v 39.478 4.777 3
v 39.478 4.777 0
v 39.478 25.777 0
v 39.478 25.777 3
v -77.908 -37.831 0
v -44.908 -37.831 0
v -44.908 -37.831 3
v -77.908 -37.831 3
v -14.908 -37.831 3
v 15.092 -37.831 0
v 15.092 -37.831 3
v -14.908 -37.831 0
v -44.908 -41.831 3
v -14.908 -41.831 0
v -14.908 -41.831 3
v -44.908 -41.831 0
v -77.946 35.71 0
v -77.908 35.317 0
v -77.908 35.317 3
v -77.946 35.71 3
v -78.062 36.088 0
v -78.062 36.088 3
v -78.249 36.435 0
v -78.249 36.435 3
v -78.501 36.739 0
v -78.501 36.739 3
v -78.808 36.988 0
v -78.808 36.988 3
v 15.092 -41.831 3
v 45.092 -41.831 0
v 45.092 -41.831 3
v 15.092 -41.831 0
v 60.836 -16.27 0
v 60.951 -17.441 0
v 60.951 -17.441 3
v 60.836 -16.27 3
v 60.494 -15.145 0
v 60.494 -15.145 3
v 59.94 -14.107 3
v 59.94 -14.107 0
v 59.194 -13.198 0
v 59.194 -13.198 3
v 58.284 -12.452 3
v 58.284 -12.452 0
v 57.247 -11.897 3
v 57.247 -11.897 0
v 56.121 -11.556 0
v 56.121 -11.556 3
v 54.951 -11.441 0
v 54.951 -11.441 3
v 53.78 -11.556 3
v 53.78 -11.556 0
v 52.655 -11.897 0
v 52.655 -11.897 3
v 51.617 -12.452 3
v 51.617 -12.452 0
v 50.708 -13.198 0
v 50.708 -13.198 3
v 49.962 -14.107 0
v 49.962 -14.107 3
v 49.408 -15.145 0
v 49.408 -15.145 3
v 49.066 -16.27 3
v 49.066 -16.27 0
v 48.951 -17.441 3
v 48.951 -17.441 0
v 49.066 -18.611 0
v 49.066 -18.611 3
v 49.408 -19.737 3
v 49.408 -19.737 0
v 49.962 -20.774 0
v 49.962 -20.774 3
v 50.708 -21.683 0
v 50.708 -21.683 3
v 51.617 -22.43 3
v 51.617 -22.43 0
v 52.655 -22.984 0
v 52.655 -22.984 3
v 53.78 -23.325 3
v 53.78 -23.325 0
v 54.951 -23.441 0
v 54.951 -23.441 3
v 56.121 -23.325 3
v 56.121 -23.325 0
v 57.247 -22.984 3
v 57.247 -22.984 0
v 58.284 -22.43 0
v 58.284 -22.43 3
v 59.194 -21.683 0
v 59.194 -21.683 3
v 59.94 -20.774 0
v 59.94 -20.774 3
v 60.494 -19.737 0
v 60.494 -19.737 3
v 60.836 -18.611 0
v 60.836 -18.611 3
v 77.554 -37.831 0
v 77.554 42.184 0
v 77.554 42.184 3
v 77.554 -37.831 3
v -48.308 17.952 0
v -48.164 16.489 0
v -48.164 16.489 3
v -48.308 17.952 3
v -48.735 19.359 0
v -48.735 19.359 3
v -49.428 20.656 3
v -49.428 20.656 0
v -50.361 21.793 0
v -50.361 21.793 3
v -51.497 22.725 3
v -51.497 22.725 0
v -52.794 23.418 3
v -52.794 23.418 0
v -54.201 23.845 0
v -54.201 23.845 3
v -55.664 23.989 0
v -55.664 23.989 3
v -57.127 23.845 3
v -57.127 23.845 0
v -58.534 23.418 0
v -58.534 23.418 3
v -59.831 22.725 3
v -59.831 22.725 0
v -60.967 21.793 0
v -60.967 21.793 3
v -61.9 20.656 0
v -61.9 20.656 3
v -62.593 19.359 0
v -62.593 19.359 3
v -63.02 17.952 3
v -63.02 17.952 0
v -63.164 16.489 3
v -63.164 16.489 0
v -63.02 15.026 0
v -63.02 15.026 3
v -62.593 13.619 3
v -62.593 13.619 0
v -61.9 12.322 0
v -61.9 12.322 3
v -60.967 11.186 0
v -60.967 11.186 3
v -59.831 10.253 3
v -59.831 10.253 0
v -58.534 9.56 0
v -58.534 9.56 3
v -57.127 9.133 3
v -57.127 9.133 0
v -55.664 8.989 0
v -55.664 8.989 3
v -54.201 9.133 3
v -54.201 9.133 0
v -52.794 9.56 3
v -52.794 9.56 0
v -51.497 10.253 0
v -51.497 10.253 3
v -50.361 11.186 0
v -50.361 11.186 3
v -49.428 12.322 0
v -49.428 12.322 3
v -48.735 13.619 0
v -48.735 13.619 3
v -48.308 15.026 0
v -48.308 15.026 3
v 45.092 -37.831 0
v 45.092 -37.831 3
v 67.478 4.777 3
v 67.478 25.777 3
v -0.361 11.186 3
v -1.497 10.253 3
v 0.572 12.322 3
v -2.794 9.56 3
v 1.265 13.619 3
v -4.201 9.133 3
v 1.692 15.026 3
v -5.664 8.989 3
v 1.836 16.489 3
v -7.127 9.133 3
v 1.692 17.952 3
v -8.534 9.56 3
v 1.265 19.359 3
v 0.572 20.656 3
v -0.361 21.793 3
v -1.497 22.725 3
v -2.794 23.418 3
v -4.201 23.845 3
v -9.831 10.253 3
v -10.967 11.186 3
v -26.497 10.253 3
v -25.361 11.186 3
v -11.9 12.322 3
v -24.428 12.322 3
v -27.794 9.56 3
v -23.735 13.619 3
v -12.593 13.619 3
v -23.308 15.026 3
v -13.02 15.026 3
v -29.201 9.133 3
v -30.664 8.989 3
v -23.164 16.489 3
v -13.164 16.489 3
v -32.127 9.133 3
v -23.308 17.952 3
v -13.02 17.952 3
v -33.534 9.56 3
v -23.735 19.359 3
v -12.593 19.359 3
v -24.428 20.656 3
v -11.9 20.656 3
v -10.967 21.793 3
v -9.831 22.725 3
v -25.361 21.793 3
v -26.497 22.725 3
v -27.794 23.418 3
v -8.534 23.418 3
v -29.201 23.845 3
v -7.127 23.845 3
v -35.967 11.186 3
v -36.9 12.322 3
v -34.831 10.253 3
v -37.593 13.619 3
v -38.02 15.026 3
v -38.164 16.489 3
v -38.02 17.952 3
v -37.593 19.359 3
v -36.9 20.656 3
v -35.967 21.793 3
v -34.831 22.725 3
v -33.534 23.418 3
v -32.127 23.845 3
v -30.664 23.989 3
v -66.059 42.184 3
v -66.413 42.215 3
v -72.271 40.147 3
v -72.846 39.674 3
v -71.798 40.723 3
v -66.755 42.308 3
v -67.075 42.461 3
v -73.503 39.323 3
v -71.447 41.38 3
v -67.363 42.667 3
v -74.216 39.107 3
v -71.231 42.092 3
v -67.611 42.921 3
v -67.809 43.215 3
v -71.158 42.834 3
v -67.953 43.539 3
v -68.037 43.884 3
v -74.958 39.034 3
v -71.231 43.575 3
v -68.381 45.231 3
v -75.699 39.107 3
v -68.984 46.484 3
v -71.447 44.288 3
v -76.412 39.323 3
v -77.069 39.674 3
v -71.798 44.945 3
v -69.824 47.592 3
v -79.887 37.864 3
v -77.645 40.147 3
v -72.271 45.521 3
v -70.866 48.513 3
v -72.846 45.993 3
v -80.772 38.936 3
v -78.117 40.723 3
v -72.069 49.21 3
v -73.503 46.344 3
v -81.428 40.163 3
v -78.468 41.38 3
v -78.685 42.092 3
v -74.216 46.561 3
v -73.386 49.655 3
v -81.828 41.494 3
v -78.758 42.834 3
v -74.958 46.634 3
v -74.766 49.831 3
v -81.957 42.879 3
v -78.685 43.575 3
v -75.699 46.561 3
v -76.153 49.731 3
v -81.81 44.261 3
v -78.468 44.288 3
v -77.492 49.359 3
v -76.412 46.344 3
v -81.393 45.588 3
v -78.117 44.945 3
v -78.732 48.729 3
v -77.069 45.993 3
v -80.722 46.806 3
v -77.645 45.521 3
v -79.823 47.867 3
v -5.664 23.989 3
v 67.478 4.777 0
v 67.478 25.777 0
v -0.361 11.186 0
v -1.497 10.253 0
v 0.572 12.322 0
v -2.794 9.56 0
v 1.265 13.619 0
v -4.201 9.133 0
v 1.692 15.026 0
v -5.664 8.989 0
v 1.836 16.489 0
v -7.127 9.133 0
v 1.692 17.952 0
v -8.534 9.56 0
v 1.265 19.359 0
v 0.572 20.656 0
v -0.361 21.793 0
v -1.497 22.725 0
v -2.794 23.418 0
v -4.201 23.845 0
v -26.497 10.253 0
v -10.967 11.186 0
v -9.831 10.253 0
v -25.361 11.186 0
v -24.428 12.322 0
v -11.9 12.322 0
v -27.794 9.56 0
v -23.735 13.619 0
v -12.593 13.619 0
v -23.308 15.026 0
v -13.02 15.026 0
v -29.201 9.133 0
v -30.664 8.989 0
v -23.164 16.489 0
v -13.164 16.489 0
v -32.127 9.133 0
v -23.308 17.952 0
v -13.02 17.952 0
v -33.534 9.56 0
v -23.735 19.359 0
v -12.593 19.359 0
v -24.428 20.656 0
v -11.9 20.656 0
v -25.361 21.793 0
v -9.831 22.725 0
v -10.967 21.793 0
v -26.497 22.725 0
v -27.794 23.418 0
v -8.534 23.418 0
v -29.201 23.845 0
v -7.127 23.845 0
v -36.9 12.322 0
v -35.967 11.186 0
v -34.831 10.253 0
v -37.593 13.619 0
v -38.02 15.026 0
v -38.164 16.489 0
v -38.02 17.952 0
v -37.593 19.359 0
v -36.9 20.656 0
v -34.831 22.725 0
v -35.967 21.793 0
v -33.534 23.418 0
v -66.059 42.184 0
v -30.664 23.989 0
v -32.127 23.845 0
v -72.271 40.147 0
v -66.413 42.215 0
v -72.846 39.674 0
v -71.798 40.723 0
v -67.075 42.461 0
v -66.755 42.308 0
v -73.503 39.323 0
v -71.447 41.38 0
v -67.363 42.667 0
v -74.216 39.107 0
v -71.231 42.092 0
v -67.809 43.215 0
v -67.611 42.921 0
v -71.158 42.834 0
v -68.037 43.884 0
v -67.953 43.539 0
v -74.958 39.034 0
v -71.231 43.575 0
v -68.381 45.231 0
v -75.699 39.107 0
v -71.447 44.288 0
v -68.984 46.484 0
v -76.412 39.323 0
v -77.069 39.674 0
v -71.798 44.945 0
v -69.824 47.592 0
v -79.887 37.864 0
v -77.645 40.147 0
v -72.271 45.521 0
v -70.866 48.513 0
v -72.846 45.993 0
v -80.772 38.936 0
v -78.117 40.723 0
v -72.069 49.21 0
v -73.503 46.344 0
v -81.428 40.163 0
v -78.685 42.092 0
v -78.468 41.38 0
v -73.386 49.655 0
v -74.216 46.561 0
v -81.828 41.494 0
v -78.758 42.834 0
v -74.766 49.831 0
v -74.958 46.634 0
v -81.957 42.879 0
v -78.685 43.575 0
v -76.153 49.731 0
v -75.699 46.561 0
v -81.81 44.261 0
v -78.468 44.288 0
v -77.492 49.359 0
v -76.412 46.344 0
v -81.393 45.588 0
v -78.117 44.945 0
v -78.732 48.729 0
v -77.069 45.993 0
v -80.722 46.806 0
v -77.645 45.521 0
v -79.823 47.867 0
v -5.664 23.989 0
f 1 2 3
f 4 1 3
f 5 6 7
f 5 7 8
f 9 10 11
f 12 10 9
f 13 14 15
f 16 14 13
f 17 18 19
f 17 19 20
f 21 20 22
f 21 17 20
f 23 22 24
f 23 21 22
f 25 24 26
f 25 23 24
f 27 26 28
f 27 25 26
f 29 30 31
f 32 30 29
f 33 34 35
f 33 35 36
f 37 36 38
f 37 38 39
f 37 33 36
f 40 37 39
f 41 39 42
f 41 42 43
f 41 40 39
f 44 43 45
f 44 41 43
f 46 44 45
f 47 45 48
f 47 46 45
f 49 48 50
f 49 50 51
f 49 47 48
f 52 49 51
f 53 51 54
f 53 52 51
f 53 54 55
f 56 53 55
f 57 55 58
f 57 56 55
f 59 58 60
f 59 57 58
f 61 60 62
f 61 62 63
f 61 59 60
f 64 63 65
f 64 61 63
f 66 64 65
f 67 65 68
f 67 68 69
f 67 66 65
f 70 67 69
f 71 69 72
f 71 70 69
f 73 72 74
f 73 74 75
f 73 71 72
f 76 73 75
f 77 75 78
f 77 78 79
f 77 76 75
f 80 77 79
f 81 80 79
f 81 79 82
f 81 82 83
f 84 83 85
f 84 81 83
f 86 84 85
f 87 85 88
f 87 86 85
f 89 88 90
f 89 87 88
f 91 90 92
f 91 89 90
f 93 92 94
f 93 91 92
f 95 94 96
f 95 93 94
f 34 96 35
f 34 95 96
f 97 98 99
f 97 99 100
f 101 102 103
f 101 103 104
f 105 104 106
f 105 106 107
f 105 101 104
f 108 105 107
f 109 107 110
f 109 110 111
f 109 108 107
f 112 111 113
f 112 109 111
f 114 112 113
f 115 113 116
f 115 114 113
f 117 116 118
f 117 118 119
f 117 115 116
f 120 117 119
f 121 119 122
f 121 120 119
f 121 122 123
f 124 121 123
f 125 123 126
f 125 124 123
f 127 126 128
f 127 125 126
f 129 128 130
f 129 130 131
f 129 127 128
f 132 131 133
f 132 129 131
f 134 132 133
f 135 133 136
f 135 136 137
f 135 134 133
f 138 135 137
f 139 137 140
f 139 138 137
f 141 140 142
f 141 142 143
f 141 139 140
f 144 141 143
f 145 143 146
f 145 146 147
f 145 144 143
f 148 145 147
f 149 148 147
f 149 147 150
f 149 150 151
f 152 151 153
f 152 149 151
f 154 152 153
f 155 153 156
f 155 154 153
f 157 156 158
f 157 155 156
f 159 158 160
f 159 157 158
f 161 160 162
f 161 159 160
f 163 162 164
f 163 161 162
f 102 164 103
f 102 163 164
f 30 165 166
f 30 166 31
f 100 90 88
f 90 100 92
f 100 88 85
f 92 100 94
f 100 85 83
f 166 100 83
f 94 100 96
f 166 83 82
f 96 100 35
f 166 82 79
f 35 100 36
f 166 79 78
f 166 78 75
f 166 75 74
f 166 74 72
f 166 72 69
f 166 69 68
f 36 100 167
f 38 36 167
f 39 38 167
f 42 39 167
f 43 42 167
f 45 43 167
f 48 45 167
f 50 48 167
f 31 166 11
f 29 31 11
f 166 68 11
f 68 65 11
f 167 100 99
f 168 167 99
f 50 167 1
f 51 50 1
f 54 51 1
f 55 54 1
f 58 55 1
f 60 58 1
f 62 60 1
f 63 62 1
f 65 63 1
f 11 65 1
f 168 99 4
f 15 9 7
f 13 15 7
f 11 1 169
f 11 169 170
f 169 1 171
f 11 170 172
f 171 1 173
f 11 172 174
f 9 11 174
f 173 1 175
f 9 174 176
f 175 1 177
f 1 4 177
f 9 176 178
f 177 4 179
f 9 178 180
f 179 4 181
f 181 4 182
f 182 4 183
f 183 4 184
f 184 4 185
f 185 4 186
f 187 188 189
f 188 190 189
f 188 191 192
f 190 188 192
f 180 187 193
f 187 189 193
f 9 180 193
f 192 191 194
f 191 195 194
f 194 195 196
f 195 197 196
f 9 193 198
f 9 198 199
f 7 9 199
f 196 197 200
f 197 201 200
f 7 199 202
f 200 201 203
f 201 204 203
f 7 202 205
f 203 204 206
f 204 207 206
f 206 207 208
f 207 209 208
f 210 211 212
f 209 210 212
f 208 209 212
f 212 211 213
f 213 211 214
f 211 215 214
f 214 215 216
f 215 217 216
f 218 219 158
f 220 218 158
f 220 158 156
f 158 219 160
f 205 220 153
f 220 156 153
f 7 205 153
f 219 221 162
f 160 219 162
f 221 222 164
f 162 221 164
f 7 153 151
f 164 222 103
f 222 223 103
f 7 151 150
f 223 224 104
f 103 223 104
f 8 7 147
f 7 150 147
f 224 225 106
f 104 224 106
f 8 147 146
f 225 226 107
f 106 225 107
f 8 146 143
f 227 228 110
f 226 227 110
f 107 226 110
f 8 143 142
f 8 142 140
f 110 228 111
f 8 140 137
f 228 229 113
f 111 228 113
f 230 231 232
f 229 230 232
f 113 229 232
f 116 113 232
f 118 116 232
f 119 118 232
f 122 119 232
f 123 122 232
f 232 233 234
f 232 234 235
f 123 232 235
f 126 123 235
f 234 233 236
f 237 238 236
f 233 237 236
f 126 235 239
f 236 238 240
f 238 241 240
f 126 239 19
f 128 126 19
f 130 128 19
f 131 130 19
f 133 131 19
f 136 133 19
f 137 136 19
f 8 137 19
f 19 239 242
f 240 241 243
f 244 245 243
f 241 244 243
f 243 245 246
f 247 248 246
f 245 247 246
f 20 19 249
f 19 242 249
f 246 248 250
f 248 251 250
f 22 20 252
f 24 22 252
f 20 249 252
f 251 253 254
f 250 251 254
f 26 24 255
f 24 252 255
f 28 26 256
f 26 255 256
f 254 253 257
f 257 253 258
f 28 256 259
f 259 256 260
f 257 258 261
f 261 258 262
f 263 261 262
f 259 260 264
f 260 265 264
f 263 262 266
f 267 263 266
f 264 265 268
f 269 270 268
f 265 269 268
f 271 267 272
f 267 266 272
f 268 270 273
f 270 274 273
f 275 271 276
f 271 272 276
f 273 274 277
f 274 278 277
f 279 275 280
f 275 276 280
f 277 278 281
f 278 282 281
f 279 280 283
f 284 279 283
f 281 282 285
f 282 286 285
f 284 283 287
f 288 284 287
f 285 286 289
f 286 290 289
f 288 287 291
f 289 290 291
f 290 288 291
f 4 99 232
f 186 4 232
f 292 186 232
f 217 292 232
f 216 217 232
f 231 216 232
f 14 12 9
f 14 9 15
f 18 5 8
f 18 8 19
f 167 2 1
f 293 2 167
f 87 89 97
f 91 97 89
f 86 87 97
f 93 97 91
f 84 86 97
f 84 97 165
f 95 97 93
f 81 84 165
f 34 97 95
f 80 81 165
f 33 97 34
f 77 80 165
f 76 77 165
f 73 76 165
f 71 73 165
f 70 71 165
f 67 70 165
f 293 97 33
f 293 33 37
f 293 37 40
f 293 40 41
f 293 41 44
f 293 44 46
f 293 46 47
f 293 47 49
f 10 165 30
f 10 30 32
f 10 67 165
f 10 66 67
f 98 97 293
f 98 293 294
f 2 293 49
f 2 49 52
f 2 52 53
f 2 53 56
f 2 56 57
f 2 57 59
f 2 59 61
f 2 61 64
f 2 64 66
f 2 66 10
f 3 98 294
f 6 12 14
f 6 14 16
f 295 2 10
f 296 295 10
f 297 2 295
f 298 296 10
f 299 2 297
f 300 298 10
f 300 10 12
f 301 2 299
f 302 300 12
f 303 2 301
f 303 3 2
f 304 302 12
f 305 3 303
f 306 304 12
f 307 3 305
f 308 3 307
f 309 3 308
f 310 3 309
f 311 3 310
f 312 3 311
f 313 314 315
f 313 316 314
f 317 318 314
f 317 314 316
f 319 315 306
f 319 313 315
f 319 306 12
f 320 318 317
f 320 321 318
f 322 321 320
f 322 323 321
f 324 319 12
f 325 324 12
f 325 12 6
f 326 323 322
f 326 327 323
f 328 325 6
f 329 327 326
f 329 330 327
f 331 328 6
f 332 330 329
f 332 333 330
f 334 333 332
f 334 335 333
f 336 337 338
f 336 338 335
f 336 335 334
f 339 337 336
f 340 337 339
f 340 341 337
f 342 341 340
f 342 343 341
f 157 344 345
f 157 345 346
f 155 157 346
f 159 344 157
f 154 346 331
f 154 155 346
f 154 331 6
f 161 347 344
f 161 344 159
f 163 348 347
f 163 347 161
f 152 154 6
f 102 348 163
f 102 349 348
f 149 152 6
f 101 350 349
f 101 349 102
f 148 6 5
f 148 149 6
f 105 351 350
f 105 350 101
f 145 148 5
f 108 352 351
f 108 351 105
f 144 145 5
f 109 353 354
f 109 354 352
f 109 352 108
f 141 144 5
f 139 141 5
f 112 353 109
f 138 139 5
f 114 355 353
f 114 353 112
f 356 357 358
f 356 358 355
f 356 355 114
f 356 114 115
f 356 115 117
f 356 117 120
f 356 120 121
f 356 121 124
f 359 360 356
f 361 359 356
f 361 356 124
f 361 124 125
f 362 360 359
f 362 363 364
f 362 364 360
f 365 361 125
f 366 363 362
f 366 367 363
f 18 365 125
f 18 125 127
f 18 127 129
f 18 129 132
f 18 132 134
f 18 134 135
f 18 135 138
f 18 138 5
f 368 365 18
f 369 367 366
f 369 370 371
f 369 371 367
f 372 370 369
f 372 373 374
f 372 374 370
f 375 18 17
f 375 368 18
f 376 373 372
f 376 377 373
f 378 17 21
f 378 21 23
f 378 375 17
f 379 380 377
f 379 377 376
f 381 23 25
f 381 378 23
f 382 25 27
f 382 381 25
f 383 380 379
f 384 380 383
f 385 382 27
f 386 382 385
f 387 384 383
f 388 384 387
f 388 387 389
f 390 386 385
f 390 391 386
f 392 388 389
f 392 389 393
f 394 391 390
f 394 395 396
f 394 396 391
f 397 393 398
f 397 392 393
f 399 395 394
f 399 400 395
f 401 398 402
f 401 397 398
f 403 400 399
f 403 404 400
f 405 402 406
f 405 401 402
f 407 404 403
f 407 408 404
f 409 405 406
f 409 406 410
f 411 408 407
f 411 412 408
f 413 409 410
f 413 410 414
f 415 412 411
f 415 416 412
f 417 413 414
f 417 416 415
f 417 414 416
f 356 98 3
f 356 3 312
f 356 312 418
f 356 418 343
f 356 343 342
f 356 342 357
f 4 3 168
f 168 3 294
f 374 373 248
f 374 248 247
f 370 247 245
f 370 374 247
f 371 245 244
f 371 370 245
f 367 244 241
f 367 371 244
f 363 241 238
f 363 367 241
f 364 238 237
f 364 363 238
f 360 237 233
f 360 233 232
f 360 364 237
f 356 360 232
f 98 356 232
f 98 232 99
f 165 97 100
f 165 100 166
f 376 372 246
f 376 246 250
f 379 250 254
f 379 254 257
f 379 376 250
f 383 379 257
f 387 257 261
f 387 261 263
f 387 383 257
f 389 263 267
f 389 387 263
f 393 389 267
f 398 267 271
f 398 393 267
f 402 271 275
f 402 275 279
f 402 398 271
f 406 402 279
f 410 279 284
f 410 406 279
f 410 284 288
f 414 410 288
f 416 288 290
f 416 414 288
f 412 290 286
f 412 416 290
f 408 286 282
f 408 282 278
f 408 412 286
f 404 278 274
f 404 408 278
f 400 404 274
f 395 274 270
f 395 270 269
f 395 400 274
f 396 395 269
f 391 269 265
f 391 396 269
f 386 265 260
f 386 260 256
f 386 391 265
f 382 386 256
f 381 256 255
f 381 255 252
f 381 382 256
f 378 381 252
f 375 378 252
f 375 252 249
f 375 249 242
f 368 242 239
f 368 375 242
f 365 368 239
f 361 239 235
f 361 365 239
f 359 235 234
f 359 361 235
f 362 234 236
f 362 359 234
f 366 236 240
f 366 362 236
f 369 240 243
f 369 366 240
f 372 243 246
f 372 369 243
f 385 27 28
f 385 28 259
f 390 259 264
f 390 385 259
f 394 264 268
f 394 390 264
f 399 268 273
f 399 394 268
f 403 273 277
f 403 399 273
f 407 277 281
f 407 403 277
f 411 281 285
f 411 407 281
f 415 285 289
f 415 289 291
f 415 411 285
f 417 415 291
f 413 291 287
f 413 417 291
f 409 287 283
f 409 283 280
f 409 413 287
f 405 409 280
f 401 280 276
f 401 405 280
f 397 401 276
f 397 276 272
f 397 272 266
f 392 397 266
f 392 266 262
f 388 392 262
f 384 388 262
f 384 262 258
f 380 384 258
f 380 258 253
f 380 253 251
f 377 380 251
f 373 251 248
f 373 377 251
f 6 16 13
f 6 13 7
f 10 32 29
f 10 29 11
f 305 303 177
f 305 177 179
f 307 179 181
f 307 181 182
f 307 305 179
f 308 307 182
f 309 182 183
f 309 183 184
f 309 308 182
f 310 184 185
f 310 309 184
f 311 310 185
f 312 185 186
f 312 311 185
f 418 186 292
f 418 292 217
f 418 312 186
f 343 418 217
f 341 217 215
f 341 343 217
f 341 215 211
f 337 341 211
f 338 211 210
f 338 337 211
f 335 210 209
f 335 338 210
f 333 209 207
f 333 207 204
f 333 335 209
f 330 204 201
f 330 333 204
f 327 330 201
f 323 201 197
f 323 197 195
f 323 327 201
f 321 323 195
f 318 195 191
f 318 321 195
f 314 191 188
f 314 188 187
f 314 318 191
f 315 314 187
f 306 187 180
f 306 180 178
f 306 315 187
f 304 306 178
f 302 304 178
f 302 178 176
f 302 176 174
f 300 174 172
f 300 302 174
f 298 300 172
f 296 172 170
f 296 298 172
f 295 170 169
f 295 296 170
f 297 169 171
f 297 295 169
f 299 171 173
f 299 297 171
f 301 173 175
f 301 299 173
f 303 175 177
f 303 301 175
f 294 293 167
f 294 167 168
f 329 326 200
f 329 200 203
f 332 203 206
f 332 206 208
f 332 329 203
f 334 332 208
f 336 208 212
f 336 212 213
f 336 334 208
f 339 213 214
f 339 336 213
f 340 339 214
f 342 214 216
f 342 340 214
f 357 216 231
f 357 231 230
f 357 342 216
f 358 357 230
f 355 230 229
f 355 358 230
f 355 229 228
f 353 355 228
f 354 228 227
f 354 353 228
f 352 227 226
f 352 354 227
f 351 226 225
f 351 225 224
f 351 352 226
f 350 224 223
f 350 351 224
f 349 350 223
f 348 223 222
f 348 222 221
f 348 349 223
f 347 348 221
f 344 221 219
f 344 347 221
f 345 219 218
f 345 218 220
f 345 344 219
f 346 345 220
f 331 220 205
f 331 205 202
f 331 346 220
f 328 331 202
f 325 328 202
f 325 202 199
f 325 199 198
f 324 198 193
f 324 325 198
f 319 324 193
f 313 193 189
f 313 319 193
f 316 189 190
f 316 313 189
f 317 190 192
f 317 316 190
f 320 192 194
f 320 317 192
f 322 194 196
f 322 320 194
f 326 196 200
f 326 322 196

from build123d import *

# Parameters (mm, degrees)
SKETCH1_R           = 3.8
SKETCH1_R_2         = 7.5
SKETCH1_R_3         = 6
SKETCH1_W           = 28
SKETCH1_H           = 21
BOSS_EXTRUDE1_DEPTH = 3


with BuildPart() as part:
    # Sketch1 → Boss-Extrude1 (new body)
    with BuildSketch(Plane.XY):
        with BuildLine():
            Line((-44.907534458, -41.831082964), (-44.907534458, -37.831082964))
            Line((-44.907534458, -37.831082964), (-74.907534458, -37.831082964))
            Line((-74.907534458, -37.831082964), (-77.907534458, -37.831082964))
            Line((-77.907534458, -37.831082964), (-77.907534458, 35.317270492))
            ThreePointArc((-77.907534458, 35.317270492), (-78.146852772, 36.26595379), (-78.807534458, 36.987599801))
            ThreePointArc((-78.807534458, 36.987599801), (-78.73201274, 48.728946501), (-68.036732481, 43.883752382))
            ThreePointArc((-68.036732481, 43.883752382), (-67.363200969, 42.667177293), (-66.059360488, 42.183752382))
            Line((-66.059360488, 42.183752382), (77.553779546, 42.183752382))
            Line((77.553779546, 42.183752382), (77.553779546, -37.831082964))
            Line((77.553779546, -37.831082964), (45.092465542, -37.831082964))
            Line((45.092465542, -37.831082964), (45.092465542, -41.831082964))
            Line((45.092465542, -41.831082964), (15.092465542, -41.831082964))
            Line((15.092465542, -41.831082964), (15.092465542, -37.831082964))
            Line((15.092465542, -37.831082964), (-14.907534458, -37.831082964))
            Line((-14.907534458, -37.831082964), (-14.907534458, -41.831082964))
            Line((-14.907534458, -41.831082964), (-44.907534458, -41.831082964))
        make_face()
        with Locations((-74.957534458, 42.833752382)):
            Circle(SKETCH1_R, mode=Mode.SUBTRACT)
        with Locations((-55.663947073, 16.489262872)):
            Circle(SKETCH1_R_2, mode=Mode.SUBTRACT)
        with Locations((-30.663947073, 16.489262872)):
            Circle(SKETCH1_R_2, mode=Mode.SUBTRACT)
        with Locations((-5.663947073, 16.489262872)):
            Circle(SKETCH1_R_2, mode=Mode.SUBTRACT)
        with Locations((54.950876551, -17.44070313)):
            Circle(SKETCH1_R_3, mode=Mode.SUBTRACT)
        with Locations((53.477773965, 15.276803872)):
            Rectangle(SKETCH1_W, SKETCH1_H, mode=Mode.SUBTRACT)
    extrude(amount=BOSS_EXTRUDE1_DEPTH)


solid = part.part
